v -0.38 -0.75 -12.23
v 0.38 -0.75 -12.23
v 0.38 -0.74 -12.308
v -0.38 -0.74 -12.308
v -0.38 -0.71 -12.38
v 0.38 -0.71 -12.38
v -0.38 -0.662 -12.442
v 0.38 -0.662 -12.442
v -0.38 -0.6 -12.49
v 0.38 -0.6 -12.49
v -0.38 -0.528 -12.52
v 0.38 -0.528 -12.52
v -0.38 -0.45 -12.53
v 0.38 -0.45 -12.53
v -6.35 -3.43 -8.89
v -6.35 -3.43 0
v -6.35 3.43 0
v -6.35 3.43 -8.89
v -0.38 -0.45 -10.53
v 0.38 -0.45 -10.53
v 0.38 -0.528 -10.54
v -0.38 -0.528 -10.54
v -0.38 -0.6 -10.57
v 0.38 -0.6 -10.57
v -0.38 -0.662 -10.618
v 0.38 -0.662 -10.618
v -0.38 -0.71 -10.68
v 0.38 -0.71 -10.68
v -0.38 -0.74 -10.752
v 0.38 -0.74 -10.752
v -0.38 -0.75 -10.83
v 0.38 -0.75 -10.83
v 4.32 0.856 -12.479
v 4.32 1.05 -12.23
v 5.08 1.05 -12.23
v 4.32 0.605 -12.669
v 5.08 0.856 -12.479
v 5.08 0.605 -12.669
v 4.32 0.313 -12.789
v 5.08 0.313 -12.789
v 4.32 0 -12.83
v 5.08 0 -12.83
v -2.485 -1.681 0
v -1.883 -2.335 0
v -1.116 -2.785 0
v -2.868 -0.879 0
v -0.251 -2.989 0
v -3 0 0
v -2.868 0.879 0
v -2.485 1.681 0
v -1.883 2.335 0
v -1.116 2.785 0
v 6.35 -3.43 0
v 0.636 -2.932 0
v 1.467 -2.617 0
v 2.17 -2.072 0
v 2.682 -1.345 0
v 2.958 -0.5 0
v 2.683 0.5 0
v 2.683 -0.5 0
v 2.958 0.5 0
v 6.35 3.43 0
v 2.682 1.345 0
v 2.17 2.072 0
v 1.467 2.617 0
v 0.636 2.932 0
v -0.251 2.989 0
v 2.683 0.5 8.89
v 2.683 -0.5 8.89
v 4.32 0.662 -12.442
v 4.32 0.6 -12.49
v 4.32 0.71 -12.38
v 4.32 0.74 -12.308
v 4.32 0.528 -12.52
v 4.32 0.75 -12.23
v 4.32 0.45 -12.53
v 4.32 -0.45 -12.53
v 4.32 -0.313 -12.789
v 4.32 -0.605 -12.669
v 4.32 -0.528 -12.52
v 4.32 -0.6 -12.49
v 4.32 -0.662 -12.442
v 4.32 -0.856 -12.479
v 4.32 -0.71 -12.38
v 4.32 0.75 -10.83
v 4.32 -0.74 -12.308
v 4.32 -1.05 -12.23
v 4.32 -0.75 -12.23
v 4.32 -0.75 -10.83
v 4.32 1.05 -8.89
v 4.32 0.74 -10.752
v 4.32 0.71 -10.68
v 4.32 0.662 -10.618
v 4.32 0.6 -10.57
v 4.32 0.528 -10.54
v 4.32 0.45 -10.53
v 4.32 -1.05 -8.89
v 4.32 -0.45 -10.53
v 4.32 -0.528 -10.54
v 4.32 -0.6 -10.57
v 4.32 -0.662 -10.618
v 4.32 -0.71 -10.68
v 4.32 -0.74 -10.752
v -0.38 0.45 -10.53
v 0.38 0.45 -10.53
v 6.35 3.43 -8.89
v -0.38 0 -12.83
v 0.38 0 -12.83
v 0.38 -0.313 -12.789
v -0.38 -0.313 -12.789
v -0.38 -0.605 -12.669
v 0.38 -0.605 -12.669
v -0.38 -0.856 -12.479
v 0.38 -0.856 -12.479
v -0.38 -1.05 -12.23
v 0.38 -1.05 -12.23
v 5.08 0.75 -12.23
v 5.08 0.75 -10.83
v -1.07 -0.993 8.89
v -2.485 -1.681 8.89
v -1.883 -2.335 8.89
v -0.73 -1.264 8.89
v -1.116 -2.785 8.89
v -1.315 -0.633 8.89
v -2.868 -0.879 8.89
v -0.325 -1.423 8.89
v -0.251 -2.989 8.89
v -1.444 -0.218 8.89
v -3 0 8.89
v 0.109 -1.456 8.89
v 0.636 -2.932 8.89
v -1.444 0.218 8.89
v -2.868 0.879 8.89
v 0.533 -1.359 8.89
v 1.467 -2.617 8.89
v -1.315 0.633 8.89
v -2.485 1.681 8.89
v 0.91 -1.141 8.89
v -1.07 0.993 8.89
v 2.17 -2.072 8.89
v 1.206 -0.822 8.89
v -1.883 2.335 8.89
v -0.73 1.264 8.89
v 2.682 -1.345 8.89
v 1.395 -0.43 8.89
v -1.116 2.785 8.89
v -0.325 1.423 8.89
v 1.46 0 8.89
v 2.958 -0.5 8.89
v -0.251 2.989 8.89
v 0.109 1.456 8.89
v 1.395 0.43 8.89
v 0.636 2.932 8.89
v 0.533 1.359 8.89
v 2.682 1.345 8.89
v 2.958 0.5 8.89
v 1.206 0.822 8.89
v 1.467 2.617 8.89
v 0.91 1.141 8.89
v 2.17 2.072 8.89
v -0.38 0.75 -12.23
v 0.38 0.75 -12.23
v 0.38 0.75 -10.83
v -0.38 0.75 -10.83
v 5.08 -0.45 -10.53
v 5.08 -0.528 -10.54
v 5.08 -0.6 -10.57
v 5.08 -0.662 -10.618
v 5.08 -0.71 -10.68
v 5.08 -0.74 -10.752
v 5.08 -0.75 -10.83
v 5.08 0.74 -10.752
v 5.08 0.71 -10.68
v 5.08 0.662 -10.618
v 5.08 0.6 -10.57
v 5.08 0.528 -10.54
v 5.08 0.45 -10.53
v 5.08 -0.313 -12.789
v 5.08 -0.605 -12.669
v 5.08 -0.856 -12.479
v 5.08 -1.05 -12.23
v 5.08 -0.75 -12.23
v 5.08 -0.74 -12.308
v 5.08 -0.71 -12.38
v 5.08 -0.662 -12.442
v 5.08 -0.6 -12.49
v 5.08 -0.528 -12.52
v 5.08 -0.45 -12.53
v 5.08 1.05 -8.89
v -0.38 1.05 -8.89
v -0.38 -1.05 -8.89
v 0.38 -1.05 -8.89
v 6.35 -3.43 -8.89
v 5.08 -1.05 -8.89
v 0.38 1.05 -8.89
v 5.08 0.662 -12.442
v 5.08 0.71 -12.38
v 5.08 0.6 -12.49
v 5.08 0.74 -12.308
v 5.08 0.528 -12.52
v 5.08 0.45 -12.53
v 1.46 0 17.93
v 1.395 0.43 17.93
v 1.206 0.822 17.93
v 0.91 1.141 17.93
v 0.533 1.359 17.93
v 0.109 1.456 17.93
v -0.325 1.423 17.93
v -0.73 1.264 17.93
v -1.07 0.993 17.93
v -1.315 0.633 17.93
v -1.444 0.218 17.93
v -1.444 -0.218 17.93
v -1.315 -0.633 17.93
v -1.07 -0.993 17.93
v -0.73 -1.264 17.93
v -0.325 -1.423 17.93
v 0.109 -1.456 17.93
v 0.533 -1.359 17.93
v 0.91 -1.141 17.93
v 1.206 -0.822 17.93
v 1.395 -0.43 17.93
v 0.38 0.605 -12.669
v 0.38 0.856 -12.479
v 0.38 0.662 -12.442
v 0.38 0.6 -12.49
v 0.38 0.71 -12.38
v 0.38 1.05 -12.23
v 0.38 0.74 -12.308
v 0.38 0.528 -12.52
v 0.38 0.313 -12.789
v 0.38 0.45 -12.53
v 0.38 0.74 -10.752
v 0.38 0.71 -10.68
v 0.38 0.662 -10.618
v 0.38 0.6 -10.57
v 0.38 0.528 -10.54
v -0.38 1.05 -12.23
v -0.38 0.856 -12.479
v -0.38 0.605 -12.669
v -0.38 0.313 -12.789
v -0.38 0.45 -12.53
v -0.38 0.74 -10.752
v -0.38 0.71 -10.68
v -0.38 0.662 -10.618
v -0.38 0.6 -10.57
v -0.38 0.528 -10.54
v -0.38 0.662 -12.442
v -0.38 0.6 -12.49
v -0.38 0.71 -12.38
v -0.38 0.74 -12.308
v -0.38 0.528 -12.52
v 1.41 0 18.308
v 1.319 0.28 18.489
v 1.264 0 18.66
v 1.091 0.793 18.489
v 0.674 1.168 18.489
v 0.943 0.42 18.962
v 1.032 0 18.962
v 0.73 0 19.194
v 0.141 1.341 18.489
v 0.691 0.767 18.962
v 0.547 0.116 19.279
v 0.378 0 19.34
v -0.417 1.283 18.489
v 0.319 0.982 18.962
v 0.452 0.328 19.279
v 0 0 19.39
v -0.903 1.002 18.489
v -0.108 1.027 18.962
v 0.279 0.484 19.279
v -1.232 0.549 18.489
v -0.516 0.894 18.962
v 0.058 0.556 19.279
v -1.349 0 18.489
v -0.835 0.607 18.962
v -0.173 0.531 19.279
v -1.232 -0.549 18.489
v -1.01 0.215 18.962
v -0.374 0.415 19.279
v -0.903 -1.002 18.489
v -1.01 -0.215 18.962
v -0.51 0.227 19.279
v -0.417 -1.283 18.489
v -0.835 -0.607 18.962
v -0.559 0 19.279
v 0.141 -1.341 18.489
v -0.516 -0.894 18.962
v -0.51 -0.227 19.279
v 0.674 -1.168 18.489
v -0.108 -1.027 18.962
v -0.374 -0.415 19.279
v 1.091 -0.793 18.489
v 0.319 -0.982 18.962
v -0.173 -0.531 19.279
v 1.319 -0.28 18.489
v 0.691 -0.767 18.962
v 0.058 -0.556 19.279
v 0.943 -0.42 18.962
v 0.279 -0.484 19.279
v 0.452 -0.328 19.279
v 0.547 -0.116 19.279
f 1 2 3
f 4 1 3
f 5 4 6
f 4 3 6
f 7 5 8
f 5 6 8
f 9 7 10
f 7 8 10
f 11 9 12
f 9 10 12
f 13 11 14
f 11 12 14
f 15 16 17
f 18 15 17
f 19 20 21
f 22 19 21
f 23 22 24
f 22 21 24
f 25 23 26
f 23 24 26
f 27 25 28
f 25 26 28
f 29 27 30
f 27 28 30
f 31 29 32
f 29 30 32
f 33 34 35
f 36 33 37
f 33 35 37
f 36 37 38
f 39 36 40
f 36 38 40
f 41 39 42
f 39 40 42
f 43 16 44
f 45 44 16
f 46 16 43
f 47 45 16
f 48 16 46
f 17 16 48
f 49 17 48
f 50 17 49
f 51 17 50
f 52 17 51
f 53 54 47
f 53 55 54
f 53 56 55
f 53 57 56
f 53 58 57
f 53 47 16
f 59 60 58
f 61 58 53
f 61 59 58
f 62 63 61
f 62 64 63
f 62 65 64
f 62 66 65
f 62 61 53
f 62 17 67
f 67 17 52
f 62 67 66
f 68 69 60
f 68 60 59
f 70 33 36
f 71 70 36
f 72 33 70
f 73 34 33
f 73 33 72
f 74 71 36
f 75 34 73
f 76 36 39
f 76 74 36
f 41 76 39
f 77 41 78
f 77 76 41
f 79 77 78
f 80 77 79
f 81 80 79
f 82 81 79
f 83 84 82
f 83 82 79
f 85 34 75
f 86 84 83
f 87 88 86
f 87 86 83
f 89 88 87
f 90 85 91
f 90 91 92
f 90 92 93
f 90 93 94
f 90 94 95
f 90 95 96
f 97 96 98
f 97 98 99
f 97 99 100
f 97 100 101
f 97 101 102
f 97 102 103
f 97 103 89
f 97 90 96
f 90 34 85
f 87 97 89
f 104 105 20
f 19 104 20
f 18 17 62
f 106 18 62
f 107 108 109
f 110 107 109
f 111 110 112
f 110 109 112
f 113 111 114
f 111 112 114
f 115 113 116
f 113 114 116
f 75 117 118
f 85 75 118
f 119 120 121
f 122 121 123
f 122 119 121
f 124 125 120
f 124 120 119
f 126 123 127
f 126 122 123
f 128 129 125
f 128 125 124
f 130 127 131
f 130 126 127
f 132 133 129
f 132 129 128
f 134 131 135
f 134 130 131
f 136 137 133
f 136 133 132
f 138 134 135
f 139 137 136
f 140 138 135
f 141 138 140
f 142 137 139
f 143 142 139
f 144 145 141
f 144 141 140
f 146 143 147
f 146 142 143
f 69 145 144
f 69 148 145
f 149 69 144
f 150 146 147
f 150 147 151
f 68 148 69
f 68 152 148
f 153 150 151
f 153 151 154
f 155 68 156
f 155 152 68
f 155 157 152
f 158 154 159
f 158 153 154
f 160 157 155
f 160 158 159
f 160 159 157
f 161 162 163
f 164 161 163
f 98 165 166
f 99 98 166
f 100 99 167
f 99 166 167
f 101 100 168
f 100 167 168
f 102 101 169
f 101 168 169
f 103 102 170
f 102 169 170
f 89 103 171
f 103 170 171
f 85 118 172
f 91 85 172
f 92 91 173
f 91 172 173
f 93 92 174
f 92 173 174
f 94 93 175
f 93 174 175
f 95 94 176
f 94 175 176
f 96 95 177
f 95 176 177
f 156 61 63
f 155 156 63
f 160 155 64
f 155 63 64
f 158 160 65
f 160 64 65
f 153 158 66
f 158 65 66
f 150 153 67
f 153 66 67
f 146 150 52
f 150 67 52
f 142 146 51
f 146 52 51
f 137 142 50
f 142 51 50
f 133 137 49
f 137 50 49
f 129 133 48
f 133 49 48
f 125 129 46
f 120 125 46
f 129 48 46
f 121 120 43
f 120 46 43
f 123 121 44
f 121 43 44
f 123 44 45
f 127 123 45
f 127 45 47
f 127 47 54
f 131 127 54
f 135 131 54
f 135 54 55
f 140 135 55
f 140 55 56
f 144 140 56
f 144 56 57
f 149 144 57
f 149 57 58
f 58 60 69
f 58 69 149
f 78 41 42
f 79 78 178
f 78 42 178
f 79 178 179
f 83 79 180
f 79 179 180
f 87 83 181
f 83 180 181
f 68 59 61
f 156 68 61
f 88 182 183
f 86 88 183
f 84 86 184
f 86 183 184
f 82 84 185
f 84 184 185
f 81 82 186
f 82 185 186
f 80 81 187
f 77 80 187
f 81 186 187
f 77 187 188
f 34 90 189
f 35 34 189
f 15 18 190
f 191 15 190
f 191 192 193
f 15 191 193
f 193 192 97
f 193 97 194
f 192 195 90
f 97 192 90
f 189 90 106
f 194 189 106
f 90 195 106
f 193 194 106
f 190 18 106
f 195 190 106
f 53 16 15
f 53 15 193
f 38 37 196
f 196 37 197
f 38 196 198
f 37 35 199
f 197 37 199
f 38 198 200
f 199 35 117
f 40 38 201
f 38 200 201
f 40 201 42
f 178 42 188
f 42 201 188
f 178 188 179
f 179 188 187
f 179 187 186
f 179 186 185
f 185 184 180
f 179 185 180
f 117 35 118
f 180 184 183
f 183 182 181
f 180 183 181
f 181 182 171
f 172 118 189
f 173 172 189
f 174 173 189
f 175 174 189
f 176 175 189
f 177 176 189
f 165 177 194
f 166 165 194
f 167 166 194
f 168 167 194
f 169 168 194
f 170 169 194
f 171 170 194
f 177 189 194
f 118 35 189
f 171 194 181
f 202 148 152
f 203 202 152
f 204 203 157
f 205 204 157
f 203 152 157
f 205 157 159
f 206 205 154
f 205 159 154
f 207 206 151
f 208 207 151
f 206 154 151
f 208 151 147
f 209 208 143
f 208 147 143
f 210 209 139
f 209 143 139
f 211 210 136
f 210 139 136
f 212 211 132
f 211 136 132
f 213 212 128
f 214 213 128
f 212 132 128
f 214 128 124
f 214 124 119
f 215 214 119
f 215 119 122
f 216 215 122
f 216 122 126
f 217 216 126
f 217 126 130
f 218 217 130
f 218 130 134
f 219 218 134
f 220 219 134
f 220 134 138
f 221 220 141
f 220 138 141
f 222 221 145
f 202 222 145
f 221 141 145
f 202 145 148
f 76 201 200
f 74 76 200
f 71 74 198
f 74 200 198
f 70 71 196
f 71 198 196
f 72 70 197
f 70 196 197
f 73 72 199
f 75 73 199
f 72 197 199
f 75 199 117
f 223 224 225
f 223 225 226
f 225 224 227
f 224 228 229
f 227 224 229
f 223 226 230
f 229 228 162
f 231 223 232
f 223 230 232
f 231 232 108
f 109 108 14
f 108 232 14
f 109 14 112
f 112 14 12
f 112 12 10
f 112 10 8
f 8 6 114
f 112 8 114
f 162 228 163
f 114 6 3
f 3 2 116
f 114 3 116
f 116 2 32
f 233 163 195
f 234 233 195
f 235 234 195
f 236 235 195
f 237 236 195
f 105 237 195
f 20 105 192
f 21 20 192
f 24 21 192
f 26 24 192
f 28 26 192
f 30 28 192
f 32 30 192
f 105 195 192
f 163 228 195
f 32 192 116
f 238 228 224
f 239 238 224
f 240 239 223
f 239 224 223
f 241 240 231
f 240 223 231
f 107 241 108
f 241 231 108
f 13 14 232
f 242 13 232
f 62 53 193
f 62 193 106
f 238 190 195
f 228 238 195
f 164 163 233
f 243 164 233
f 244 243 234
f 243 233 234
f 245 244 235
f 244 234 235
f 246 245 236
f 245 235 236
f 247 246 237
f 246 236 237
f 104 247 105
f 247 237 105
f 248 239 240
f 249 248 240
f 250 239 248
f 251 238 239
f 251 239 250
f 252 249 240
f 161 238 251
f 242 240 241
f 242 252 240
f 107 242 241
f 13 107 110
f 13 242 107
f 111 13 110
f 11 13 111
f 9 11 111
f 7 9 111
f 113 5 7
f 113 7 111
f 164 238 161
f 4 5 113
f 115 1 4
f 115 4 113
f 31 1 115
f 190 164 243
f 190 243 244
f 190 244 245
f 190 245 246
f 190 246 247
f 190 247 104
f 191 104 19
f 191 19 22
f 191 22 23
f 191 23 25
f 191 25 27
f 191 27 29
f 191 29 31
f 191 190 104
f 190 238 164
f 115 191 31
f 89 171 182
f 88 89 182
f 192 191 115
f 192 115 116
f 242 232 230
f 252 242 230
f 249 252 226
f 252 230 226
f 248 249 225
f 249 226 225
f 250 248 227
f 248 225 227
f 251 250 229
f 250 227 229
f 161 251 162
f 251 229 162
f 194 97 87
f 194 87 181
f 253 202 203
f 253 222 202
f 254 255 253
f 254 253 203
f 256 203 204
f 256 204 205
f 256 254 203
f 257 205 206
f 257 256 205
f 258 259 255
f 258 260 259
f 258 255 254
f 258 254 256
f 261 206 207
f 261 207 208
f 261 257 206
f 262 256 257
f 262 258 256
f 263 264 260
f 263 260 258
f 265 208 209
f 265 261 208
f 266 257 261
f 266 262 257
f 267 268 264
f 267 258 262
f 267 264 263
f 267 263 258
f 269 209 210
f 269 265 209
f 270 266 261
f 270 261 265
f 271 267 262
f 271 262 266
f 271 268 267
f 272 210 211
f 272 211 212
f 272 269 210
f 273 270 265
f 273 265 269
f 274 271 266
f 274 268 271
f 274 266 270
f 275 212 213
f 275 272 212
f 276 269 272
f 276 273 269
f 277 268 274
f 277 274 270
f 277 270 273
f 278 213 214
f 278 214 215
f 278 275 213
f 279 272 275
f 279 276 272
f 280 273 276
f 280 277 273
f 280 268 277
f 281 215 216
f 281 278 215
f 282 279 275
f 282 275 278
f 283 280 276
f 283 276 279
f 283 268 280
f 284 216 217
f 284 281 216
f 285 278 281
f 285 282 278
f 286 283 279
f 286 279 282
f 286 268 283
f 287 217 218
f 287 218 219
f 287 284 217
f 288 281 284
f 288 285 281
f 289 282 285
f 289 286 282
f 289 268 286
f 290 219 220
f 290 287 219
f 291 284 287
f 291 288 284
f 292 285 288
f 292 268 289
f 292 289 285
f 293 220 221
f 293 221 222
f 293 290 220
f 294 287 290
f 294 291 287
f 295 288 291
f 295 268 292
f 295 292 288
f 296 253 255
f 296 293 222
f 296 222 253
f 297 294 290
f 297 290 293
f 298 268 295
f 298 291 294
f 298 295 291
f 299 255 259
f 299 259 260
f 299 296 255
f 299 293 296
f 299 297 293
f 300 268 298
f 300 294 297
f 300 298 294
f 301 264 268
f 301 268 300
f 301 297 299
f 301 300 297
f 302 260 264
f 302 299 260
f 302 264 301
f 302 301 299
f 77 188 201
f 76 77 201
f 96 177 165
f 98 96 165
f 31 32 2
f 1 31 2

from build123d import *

# Parameters (mm, degrees)
F0_W      = 12.7
F0_H      = 6.86
F1_DEPTH  = 8.89
F2_R      = 3
F3_DEPTH  = 8.89
F4_R      = 1.46
F5_DEPTH  = 10.5
F6_R      = 1.46
F7_W      = 0.434782
F7_H      = 1
F8_DEPTH  = 25
F9_W      = 0.76
F9_H      = 2.1
F10_DEPTH = 3.94
F12_DEPTH = 11.431


with BuildPart() as f1:
    # F0 (on Top) → F1 (new body)
    with BuildSketch(Plane.XY):
        Rectangle(F0_W, F0_H)
    extrude(amount=-F1_DEPTH)

    # F2 (on Top) → F3 (join)
    with BuildSketch(Plane.XY):
        Circle(F2_R)
    extrude(amount=F3_DEPTH)

    # F4 (on face) → F5 (join)
    with BuildSketch(Plane.XY.offset(8.89)):
        Circle(F4_R)
    extrude(amount=F5_DEPTH)

    # F6
    f6_edges = [f1.edges().sort_by_distance(p)[0] for p in [
        (-1.46, 0, 19.39),
    ]]
    fillet(f6_edges, radius=F6_R)

    # F7 (on Top) → F8 (cut)
    with BuildSketch(Plane.XY):
        with Locations((2.9, 0)):
            Rectangle(F7_W, F7_H)
    extrude(amount=F8_DEPTH, mode=Mode.SUBTRACT)

    # F9 (on face) → F10 (join)
    with BuildSketch(Plane(origin=(0, 0, -8.89), x_dir=(1, 0, 0), z_dir=(0, 0, -1))):
        Rectangle(F9_W, F9_H)
        with Locations((4.7, 0)):
            Rectangle(F9_W, F9_H)
    extrude(amount=F10_DEPTH)

    # F11 (on face) → F12 (cut, through all)
    with BuildSketch(Plane.YZ.offset(5.08)):
        with BuildLine():
            Line((0.45, -10.53), (-0.45, -10.53))
            ThreePointArc((-0.45, -10.53), (-0.662132, -10.617868), (-0.75, -10.83))
            Line((-0.75, -10.83), (-0.75, -12.23))
            ThreePointArc((-0.75, -12.23), (-0.662132, -12.442132), (-0.45, -12.53))
            Line((-0.45, -12.53), (0.45, -12.53))
            ThreePointArc((0.45, -12.53), (0.662132, -12.442132), (0.75, -12.23))
            Line((0.75, -12.23), (0.75, -10.83))
            ThreePointArc((0.75, -10.83), (0.662132, -10.617868), (0.45, -10.53))
        make_face()
        with BuildLine():
            ThreePointArc((1.05, -12.23), (0.604669, -12.669421), (0, -12.83))
            Line((0, -12.83), (1.05, -12.83))
            Line((1.05, -12.83), (1.05, -12.23))
        make_face()
        with BuildLine():
            ThreePointArc((0, -12.83), (-0.604669, -12.669421), (-1.05, -12.23))
            Line((-1.05, -12.23), (-1.05, -12.83))
            Line((-1.05, -12.83), (0, -12.83))
        make_face()
    extrude(amount=-F12_DEPTH, mode=Mode.SUBTRACT)


solid = f1.part
